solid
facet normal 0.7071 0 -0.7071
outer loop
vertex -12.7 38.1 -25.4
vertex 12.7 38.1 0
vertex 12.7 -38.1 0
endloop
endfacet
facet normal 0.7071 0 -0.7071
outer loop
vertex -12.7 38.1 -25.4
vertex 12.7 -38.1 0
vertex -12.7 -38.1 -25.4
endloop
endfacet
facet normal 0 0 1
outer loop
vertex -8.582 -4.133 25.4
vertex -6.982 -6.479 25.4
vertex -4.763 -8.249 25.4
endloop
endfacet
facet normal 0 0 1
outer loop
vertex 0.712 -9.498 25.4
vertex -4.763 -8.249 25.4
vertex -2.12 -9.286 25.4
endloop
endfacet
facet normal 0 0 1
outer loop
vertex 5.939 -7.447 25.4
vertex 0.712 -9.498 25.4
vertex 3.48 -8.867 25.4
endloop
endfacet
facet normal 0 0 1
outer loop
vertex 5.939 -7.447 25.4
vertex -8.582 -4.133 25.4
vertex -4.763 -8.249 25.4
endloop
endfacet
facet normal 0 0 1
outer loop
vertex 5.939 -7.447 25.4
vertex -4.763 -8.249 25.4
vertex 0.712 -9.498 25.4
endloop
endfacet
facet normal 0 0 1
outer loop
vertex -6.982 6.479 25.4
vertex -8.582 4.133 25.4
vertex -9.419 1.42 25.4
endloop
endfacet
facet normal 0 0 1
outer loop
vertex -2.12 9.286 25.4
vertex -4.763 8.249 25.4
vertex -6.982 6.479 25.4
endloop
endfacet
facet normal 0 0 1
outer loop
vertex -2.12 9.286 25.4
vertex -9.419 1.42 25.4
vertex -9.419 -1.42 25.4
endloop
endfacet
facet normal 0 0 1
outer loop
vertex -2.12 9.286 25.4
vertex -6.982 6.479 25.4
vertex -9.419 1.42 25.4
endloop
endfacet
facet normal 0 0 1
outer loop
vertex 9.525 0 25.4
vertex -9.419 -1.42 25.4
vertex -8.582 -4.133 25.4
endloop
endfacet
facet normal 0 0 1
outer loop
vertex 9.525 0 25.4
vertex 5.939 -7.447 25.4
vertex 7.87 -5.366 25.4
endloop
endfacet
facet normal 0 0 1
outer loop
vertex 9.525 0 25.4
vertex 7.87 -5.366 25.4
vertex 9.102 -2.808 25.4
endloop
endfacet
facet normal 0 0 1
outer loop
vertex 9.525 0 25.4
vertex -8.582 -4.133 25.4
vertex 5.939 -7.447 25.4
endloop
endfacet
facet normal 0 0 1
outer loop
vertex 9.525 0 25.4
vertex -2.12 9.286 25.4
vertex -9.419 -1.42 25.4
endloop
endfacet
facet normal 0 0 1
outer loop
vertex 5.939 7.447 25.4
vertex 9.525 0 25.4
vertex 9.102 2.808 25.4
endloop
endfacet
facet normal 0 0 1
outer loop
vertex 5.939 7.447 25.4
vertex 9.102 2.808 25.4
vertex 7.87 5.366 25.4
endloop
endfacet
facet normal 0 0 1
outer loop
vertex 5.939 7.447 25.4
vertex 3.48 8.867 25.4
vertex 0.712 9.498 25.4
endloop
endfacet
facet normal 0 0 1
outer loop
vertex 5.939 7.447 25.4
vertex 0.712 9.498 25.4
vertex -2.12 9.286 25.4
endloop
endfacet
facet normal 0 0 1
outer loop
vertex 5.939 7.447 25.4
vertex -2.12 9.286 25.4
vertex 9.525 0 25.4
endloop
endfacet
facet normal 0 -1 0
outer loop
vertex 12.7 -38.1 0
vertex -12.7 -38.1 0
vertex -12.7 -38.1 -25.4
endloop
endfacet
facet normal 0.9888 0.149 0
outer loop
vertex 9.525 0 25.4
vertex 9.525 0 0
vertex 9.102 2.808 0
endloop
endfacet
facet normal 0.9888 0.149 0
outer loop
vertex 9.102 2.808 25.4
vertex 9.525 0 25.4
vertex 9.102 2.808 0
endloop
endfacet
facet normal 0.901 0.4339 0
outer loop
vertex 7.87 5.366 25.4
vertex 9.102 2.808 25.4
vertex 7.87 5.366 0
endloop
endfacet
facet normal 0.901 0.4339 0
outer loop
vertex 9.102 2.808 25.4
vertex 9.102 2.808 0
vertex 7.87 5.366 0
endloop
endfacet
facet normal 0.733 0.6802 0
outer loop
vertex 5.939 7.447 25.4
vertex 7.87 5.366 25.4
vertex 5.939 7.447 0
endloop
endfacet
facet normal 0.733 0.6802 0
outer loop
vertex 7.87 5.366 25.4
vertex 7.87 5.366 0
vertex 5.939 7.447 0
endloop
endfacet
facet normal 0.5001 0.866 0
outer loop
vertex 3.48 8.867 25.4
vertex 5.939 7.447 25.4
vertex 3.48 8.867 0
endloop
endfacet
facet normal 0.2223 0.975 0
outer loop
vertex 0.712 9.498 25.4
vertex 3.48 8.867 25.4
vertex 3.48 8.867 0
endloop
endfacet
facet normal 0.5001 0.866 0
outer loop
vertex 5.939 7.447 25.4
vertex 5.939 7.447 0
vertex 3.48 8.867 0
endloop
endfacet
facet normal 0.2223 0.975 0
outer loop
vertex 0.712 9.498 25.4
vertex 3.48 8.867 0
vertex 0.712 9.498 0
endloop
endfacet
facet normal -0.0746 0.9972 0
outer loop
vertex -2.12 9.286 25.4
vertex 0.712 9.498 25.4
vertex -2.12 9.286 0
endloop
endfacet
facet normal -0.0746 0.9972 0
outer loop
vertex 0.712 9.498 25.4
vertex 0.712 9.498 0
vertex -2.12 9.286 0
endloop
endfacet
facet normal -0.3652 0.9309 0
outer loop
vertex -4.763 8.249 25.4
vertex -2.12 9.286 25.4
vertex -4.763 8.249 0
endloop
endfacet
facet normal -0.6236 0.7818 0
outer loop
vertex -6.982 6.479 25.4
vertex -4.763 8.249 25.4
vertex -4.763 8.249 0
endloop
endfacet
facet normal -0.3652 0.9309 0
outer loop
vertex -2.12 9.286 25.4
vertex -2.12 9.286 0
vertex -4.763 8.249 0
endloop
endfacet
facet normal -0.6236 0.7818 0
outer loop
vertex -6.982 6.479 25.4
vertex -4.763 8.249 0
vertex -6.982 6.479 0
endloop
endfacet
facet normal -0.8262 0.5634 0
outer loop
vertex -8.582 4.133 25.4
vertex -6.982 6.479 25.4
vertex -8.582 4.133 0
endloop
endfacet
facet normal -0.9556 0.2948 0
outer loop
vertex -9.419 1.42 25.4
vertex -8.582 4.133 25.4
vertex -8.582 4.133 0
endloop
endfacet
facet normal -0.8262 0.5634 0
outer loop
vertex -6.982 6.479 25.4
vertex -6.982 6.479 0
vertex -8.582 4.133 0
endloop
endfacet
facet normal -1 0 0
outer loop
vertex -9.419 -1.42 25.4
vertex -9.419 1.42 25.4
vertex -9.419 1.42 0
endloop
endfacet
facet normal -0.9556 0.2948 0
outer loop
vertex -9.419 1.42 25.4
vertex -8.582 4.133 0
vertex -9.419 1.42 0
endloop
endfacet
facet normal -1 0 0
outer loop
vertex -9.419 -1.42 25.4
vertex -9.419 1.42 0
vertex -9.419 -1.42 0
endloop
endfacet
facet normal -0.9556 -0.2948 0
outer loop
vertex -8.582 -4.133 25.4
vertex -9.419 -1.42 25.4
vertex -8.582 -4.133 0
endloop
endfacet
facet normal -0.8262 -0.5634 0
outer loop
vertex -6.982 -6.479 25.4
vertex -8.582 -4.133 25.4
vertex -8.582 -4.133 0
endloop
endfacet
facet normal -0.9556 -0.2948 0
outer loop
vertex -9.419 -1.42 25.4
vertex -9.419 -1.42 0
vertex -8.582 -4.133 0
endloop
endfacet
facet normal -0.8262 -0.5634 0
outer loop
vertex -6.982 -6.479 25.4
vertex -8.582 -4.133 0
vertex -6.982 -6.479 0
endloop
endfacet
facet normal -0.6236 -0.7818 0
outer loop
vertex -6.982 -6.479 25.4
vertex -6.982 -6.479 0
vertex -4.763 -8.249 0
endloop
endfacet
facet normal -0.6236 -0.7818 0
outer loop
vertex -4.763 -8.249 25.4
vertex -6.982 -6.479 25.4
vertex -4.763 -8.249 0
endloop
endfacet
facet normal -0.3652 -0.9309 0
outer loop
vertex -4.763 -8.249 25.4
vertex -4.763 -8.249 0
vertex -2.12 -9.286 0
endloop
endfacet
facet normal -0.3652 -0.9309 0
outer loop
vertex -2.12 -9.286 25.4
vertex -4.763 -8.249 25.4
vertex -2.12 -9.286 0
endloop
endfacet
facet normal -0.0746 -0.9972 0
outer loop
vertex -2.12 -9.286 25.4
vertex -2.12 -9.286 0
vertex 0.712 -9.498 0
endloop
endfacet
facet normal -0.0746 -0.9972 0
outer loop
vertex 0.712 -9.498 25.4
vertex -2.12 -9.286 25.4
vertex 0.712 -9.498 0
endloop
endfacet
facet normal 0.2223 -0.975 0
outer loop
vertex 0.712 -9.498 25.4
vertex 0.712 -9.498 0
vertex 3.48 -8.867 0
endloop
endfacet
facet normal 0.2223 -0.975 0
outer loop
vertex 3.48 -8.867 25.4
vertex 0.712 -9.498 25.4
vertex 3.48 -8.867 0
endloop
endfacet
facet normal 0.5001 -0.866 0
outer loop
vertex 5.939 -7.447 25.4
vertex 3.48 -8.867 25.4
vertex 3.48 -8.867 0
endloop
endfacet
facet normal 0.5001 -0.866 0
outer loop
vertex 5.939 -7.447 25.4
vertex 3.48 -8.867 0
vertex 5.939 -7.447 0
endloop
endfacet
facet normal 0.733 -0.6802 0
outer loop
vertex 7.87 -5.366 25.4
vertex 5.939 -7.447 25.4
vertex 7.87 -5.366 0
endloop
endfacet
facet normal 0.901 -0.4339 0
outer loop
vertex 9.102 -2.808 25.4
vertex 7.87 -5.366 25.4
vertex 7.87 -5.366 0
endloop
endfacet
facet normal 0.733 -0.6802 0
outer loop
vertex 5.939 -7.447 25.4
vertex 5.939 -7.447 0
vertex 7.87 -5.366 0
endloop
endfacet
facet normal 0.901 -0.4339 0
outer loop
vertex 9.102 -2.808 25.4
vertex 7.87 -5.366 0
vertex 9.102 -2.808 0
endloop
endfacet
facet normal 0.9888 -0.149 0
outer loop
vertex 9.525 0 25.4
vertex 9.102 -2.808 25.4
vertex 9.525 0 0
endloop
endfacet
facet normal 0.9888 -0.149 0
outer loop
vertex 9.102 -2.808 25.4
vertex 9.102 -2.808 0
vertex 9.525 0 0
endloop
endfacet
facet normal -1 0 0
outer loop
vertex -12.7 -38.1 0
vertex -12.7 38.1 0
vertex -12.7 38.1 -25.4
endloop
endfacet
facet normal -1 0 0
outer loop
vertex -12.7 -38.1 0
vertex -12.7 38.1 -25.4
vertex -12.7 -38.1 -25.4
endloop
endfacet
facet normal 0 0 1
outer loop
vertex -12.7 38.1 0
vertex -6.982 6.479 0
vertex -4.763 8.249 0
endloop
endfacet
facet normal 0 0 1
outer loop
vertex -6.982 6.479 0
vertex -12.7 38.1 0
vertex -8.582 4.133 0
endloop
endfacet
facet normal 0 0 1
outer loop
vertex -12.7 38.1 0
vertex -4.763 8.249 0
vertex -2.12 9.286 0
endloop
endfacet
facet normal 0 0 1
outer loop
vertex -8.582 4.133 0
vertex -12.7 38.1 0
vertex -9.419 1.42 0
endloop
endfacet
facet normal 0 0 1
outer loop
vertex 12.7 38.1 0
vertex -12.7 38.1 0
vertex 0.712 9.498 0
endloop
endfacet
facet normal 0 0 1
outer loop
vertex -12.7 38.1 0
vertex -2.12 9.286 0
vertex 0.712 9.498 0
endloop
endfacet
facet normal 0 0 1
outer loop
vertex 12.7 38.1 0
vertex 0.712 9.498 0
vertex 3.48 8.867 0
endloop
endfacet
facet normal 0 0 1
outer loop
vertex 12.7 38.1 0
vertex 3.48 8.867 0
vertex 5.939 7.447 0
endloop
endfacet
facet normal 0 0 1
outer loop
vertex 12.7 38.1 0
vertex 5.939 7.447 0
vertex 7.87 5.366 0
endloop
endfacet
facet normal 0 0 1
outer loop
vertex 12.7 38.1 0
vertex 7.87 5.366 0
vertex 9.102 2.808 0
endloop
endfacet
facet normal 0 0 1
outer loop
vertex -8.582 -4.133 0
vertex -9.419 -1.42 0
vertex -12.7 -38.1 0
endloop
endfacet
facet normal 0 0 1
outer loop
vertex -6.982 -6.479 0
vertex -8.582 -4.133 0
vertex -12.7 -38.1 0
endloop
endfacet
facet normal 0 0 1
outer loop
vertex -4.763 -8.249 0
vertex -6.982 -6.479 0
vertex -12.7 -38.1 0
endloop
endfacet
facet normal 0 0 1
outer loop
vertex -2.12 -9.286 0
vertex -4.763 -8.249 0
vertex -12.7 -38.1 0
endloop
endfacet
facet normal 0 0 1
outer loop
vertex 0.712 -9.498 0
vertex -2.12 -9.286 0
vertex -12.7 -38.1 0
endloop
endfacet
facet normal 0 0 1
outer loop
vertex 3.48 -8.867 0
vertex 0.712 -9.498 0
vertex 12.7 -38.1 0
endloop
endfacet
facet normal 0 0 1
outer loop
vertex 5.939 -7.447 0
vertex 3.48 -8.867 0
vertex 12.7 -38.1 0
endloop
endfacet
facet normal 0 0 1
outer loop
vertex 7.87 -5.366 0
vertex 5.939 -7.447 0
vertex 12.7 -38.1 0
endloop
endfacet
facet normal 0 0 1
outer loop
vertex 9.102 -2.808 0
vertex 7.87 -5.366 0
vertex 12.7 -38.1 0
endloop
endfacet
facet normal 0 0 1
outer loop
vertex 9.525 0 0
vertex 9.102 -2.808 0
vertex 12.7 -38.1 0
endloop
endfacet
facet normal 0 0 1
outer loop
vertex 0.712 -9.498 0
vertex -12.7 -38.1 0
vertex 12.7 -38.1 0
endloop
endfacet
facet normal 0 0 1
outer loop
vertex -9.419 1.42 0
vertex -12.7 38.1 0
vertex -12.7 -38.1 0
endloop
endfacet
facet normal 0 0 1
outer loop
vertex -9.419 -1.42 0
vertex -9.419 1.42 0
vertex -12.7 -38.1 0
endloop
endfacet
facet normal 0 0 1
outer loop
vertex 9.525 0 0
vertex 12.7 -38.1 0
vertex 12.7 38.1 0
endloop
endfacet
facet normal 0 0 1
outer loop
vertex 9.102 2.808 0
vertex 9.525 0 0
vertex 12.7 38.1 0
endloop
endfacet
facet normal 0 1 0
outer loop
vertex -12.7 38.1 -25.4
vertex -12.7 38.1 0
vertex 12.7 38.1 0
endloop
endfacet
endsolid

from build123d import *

# Parameters (mm, degrees)
F0_R     = 9.525
F1_DEPTH = 25.4
F2_W     = 25.4
F2_H     = 76.2
F3_DEPTH = 25.4
F5_DEPTH = 76.201


with BuildPart() as f1:
    # F0 (on Top) → F1 (new body)
    with BuildSketch(Plane.XY):
        Circle(F0_R)
    extrude(amount=F1_DEPTH)

    # F2 (on face) → F3 (join)
    with BuildSketch(Plane(origin=(0, 0, 0), x_dir=(1, 0, 0), z_dir=(0, 0, -1))):
        Rectangle(F2_W, F2_H)
    extrude(amount=F3_DEPTH)

    # F4 (on face) → F5 (cut, through all)
    with BuildSketch(Plane.XZ.offset(38.1)):
        Polygon((12.7, -25.4), (12.7, 0), (-12.7, -25.4), align=None)
    extrude(amount=-F5_DEPTH, mode=Mode.SUBTRACT)


solid = f1.part
